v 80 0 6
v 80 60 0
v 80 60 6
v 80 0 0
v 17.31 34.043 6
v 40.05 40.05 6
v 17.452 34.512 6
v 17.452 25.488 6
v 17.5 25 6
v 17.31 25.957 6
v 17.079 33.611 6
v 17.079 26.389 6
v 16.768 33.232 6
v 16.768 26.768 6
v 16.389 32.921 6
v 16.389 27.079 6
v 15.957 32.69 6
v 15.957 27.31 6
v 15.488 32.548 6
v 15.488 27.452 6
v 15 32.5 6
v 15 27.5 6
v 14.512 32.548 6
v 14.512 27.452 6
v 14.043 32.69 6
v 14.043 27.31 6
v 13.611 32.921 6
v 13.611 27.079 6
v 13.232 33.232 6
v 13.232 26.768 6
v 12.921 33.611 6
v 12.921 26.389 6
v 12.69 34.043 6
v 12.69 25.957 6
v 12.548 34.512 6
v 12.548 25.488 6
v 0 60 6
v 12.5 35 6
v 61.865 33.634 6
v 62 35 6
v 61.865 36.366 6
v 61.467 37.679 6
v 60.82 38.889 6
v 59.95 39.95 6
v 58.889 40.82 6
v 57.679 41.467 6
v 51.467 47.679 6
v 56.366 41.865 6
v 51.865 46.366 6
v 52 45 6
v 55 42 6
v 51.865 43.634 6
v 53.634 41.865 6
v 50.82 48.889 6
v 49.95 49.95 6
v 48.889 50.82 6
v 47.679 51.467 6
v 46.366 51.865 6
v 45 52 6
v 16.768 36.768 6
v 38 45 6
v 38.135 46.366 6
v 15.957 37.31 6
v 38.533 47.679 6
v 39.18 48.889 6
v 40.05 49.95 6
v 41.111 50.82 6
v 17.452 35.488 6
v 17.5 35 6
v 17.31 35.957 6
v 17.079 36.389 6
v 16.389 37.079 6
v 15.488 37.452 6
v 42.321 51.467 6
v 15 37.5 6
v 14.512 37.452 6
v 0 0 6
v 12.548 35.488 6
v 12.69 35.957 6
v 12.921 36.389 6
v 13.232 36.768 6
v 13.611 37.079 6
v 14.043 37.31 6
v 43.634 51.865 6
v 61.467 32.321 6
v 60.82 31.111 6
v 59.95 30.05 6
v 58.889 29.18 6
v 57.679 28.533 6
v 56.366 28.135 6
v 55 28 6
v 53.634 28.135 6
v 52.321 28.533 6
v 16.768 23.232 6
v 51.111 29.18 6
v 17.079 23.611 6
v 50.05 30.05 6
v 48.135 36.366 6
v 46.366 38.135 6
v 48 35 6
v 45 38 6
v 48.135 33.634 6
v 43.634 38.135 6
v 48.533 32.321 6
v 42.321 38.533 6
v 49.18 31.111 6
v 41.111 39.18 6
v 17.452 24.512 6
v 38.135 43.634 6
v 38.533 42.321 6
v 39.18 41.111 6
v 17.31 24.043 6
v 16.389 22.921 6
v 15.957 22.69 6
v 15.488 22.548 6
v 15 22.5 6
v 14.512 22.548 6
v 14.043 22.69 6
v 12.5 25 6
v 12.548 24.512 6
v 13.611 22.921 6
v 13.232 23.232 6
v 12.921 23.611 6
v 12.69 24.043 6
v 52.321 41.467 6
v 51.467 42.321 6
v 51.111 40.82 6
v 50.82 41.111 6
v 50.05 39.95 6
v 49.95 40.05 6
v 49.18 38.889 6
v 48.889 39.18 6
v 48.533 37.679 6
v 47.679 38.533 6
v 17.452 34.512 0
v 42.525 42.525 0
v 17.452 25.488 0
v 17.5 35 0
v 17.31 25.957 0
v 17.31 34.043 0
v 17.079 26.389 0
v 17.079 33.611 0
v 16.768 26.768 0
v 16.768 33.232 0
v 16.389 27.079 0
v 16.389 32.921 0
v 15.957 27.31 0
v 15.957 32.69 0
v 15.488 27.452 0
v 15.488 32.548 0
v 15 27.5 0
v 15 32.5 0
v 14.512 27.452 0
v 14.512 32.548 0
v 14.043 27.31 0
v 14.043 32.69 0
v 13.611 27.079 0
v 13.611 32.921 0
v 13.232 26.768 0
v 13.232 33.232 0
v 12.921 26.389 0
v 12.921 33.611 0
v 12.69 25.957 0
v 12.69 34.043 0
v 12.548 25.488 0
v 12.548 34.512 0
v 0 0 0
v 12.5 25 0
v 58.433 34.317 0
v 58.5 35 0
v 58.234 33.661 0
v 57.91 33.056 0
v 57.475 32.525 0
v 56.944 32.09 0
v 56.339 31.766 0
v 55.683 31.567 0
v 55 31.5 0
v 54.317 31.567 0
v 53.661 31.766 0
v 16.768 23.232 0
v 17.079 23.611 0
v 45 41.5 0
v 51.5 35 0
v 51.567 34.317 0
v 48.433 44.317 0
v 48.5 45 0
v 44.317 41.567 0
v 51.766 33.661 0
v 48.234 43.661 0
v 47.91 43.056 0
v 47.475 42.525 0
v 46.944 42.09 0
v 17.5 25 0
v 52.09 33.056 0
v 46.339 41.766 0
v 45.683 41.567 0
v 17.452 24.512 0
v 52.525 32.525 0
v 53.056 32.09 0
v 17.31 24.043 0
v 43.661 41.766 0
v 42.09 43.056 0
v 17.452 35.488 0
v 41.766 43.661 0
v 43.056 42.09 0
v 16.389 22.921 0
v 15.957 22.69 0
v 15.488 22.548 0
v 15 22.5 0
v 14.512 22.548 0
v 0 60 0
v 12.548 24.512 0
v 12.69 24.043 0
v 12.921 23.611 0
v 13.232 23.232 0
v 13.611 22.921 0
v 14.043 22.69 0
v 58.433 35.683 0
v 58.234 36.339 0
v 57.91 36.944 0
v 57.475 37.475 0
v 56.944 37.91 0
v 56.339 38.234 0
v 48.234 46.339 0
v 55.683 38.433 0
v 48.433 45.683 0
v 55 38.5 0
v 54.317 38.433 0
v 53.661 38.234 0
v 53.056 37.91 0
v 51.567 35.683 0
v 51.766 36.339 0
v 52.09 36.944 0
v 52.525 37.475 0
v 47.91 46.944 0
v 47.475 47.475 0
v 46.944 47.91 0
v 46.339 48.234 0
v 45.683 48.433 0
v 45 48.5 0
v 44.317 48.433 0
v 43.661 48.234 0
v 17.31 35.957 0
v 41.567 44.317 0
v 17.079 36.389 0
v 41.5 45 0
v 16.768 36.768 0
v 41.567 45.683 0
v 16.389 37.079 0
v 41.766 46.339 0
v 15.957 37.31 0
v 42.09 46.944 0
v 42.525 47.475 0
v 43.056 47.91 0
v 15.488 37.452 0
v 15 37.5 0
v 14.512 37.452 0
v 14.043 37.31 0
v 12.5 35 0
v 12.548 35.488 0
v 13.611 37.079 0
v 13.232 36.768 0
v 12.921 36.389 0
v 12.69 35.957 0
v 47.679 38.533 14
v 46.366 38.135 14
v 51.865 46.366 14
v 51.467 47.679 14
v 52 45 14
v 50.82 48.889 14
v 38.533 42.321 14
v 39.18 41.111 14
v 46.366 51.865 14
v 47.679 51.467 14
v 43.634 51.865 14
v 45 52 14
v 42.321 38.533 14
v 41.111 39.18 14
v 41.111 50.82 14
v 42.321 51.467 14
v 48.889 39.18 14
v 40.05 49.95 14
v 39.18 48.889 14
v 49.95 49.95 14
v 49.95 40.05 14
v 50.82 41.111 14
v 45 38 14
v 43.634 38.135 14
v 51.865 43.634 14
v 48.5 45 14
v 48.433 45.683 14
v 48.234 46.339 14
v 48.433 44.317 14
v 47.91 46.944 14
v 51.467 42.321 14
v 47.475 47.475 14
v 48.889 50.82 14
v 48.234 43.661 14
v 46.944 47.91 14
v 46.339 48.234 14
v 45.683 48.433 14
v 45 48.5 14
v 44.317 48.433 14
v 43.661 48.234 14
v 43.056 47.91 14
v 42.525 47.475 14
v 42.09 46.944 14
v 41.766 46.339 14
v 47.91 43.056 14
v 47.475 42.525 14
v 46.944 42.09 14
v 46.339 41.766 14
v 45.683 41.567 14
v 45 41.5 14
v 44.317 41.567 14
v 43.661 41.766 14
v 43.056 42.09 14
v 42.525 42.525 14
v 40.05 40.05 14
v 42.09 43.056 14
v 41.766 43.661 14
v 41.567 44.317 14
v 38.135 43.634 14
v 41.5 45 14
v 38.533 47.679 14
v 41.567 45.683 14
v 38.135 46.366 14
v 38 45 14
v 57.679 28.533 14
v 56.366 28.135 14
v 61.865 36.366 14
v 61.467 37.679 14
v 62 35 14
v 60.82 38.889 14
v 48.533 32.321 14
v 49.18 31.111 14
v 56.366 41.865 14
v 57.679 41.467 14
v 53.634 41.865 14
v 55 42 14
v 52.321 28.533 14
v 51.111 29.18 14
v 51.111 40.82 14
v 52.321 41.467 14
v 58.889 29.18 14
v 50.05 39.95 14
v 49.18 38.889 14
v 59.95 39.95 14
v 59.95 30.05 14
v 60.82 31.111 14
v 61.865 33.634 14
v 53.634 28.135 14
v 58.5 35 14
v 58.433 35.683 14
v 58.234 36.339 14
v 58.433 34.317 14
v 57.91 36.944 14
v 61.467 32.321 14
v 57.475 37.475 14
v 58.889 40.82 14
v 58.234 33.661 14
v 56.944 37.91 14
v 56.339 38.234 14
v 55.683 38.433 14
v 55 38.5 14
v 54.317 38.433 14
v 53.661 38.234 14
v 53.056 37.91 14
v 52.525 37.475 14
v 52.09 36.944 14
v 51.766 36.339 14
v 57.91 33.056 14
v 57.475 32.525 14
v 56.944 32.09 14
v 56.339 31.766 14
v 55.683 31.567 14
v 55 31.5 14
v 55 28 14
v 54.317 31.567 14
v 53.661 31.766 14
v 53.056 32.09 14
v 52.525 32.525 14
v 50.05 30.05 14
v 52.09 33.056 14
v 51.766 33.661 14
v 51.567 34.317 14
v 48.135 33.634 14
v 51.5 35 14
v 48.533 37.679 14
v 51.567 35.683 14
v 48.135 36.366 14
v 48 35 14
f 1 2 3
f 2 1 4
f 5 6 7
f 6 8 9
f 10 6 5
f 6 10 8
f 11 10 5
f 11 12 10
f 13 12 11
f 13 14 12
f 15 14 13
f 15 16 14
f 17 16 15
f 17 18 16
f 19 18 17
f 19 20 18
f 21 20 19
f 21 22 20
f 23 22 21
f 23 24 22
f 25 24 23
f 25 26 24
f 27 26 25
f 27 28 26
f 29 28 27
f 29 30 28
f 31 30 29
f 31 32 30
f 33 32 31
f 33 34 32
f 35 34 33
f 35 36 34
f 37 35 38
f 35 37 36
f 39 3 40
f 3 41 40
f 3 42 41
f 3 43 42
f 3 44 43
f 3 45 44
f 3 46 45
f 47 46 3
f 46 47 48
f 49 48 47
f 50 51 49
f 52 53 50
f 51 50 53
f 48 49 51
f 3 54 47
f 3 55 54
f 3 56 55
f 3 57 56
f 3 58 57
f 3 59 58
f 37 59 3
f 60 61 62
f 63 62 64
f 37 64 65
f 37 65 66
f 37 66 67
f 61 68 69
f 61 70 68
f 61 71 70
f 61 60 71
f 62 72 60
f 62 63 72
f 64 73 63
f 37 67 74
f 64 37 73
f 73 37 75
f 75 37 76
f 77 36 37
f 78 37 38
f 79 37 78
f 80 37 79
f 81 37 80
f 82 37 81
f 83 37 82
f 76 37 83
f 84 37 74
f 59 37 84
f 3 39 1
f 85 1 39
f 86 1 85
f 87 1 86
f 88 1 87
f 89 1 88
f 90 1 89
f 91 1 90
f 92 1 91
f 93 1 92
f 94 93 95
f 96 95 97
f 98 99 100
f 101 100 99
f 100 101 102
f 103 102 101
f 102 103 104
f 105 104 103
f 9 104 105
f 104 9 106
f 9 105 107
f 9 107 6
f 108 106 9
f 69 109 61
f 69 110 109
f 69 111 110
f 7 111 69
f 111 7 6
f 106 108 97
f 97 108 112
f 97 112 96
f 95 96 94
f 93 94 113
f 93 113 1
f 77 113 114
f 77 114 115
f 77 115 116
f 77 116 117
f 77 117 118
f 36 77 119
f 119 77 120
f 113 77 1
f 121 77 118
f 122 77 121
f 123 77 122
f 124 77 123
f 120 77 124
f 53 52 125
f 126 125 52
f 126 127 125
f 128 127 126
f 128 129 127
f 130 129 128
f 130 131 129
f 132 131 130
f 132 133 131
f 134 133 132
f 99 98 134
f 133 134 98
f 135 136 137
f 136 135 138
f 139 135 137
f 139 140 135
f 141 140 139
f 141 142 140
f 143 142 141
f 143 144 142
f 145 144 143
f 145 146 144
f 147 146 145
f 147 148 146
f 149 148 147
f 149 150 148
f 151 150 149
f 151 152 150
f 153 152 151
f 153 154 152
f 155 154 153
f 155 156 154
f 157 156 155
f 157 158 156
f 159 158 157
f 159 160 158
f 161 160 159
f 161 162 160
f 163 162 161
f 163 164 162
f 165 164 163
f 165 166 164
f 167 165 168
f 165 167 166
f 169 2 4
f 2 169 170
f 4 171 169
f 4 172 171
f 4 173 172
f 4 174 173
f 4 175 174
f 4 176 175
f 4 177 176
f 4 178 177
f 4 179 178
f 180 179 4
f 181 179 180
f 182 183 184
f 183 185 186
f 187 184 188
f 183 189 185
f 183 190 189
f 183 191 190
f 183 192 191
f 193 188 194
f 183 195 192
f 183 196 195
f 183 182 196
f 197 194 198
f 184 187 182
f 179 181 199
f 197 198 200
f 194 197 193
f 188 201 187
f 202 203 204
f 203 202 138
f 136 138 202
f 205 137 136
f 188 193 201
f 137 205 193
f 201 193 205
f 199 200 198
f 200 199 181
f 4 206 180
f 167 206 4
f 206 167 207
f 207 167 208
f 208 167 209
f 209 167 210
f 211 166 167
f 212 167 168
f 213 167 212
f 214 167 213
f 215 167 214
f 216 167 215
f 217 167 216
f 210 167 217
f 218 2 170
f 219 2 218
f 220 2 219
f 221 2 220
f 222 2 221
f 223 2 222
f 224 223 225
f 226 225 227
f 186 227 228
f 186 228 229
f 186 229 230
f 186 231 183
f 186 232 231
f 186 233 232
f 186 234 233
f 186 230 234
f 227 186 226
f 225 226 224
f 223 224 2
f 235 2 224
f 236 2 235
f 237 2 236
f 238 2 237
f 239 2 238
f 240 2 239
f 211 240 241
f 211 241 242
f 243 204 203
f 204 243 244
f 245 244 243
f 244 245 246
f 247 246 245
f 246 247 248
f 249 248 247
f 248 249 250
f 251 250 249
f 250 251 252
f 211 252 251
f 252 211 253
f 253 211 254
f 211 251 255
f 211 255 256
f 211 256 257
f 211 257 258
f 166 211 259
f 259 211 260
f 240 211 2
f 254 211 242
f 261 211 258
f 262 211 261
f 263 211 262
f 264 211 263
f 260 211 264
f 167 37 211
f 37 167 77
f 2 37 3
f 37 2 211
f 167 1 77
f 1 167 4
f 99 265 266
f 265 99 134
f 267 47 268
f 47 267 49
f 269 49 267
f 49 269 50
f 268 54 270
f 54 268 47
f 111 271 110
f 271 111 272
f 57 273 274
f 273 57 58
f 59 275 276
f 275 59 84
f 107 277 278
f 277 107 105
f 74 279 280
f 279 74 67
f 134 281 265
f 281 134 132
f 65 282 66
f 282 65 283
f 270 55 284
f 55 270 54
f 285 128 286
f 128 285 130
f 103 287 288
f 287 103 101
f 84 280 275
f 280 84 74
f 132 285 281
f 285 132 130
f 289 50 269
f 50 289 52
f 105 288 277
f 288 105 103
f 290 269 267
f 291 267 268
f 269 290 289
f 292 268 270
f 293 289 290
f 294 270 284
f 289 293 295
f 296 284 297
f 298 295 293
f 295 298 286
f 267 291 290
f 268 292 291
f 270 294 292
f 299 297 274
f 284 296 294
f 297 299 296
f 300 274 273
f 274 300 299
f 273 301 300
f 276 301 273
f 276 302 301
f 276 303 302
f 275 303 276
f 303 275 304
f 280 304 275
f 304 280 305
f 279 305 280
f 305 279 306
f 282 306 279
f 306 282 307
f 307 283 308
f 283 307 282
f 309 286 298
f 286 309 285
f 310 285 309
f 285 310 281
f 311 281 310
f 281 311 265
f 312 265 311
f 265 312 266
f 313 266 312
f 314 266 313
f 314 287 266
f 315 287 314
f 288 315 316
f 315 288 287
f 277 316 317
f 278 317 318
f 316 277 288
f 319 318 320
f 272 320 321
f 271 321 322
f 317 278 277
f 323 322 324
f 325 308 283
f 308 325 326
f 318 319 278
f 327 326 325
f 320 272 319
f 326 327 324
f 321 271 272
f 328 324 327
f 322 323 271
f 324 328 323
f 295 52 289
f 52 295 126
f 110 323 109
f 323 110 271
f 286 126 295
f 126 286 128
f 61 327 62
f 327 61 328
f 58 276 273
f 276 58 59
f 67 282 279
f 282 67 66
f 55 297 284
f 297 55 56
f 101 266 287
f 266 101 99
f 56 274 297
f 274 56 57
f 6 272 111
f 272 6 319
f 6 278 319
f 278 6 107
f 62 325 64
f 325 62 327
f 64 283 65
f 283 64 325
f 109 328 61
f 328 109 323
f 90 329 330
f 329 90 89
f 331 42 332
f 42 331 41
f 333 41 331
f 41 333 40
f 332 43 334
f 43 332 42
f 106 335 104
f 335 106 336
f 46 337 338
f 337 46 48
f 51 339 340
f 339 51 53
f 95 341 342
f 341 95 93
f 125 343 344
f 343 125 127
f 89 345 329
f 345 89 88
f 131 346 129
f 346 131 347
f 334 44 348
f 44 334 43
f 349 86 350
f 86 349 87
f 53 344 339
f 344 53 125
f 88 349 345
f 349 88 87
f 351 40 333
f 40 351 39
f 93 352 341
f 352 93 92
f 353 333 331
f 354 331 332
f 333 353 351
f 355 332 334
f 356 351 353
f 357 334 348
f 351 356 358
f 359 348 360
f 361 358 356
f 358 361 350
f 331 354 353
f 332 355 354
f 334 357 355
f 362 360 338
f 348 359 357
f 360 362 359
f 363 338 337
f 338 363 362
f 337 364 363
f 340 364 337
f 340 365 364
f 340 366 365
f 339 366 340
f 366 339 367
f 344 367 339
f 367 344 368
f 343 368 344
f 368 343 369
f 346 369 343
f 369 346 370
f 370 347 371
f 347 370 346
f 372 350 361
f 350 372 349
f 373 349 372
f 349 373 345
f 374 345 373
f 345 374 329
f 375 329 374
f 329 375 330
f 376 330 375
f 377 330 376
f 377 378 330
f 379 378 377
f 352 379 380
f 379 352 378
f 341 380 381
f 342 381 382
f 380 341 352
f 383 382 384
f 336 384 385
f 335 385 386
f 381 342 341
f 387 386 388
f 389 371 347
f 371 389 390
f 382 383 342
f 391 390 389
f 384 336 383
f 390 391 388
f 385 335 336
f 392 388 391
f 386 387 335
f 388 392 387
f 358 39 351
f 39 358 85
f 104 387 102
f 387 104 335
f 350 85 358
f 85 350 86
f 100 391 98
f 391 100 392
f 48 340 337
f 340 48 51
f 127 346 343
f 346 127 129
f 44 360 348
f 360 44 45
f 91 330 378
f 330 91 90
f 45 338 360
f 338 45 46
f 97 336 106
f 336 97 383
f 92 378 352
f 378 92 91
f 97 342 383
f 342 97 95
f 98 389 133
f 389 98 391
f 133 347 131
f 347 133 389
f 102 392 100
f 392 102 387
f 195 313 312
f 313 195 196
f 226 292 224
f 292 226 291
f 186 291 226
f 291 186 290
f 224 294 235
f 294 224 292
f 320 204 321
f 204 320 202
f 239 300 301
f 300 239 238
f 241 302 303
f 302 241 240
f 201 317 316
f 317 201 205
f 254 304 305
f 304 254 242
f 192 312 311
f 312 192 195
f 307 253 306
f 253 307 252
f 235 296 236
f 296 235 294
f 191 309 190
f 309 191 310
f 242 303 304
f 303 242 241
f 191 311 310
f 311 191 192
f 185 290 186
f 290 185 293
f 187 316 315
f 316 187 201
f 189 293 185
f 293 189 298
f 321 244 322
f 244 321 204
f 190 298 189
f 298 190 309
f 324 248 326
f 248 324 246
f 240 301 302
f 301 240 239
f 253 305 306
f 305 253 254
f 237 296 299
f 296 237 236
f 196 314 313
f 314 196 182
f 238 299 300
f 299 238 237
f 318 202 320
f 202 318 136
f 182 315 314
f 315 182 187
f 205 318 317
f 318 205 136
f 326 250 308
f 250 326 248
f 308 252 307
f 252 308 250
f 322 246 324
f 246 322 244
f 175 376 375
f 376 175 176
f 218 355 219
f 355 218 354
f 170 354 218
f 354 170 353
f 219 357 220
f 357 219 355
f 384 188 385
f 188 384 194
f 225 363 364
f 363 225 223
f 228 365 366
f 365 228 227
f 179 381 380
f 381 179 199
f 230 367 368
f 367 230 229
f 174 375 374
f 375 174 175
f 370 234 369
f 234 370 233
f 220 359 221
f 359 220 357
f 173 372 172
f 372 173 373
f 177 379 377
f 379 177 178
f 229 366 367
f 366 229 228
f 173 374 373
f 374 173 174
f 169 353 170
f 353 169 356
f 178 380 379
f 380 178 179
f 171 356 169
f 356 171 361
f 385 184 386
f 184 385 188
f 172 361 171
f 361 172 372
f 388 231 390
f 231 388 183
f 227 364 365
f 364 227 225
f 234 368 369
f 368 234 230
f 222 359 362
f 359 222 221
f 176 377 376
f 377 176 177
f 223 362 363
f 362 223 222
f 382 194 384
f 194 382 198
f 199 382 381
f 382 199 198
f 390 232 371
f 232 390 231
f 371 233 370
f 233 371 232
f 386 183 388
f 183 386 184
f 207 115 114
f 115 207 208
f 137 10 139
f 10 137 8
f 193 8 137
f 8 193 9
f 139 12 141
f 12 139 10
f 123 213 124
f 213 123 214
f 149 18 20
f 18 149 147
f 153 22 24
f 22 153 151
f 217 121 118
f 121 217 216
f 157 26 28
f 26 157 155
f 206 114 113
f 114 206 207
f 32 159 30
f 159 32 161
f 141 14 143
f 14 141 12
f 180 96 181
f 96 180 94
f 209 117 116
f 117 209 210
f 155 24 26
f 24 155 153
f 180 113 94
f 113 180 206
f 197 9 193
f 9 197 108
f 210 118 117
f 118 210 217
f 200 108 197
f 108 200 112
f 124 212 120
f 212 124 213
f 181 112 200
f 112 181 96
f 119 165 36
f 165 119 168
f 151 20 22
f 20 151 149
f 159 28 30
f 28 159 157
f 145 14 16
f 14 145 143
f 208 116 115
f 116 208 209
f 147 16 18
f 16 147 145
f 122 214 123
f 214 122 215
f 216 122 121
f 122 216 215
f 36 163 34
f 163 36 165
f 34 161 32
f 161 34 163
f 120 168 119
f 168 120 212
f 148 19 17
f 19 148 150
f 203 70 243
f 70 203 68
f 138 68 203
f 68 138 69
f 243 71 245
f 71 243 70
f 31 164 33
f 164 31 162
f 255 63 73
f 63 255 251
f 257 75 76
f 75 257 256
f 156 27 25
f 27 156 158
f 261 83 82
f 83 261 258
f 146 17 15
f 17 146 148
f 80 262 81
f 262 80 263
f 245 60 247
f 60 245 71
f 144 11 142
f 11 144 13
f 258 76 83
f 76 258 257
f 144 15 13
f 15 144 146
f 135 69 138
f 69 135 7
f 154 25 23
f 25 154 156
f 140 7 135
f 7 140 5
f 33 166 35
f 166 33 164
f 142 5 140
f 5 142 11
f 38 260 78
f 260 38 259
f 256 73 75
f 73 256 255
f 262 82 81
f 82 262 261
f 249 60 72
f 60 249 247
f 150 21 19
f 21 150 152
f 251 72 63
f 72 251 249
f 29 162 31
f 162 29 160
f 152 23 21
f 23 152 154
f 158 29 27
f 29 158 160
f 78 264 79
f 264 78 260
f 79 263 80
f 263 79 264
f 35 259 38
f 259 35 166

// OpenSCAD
$fn = 32;

// ----------------------------------------------------------------------
// Mixed field: bosses and holes at given coordinates
// ----------------------------------------------------------------------

// --- parameters (mm) ---
plate_l = 80;             // plate length, X
plate_w = 60;             // plate width, Y
plate_t = 6;              // plate thickness, Z
boss_d = 14;              // boss diameter
boss_h = 8;               // boss height above the plate
hole_d = 5;               // through hole diameter

total_h = plate_t + boss_h;  // overall height

difference() {
  union() {
    cube([plate_l, plate_w, plate_t]);
    translate([45, 45, plate_t]) cylinder(h = boss_h, d = boss_d);
    translate([55, 35, plate_t]) cylinder(h = boss_h, d = boss_d);
  }
  translate([45, 45, -1]) cylinder(h = total_h + 2, d = boss_d / 2);
  translate([55, 35, -1]) cylinder(h = total_h + 2, d = boss_d / 2);
  translate([15, 25, -1]) cylinder(h = plate_t + 2, d = hole_d);
  translate([15, 35, -1]) cylinder(h = plate_t + 2, d = hole_d);
}
